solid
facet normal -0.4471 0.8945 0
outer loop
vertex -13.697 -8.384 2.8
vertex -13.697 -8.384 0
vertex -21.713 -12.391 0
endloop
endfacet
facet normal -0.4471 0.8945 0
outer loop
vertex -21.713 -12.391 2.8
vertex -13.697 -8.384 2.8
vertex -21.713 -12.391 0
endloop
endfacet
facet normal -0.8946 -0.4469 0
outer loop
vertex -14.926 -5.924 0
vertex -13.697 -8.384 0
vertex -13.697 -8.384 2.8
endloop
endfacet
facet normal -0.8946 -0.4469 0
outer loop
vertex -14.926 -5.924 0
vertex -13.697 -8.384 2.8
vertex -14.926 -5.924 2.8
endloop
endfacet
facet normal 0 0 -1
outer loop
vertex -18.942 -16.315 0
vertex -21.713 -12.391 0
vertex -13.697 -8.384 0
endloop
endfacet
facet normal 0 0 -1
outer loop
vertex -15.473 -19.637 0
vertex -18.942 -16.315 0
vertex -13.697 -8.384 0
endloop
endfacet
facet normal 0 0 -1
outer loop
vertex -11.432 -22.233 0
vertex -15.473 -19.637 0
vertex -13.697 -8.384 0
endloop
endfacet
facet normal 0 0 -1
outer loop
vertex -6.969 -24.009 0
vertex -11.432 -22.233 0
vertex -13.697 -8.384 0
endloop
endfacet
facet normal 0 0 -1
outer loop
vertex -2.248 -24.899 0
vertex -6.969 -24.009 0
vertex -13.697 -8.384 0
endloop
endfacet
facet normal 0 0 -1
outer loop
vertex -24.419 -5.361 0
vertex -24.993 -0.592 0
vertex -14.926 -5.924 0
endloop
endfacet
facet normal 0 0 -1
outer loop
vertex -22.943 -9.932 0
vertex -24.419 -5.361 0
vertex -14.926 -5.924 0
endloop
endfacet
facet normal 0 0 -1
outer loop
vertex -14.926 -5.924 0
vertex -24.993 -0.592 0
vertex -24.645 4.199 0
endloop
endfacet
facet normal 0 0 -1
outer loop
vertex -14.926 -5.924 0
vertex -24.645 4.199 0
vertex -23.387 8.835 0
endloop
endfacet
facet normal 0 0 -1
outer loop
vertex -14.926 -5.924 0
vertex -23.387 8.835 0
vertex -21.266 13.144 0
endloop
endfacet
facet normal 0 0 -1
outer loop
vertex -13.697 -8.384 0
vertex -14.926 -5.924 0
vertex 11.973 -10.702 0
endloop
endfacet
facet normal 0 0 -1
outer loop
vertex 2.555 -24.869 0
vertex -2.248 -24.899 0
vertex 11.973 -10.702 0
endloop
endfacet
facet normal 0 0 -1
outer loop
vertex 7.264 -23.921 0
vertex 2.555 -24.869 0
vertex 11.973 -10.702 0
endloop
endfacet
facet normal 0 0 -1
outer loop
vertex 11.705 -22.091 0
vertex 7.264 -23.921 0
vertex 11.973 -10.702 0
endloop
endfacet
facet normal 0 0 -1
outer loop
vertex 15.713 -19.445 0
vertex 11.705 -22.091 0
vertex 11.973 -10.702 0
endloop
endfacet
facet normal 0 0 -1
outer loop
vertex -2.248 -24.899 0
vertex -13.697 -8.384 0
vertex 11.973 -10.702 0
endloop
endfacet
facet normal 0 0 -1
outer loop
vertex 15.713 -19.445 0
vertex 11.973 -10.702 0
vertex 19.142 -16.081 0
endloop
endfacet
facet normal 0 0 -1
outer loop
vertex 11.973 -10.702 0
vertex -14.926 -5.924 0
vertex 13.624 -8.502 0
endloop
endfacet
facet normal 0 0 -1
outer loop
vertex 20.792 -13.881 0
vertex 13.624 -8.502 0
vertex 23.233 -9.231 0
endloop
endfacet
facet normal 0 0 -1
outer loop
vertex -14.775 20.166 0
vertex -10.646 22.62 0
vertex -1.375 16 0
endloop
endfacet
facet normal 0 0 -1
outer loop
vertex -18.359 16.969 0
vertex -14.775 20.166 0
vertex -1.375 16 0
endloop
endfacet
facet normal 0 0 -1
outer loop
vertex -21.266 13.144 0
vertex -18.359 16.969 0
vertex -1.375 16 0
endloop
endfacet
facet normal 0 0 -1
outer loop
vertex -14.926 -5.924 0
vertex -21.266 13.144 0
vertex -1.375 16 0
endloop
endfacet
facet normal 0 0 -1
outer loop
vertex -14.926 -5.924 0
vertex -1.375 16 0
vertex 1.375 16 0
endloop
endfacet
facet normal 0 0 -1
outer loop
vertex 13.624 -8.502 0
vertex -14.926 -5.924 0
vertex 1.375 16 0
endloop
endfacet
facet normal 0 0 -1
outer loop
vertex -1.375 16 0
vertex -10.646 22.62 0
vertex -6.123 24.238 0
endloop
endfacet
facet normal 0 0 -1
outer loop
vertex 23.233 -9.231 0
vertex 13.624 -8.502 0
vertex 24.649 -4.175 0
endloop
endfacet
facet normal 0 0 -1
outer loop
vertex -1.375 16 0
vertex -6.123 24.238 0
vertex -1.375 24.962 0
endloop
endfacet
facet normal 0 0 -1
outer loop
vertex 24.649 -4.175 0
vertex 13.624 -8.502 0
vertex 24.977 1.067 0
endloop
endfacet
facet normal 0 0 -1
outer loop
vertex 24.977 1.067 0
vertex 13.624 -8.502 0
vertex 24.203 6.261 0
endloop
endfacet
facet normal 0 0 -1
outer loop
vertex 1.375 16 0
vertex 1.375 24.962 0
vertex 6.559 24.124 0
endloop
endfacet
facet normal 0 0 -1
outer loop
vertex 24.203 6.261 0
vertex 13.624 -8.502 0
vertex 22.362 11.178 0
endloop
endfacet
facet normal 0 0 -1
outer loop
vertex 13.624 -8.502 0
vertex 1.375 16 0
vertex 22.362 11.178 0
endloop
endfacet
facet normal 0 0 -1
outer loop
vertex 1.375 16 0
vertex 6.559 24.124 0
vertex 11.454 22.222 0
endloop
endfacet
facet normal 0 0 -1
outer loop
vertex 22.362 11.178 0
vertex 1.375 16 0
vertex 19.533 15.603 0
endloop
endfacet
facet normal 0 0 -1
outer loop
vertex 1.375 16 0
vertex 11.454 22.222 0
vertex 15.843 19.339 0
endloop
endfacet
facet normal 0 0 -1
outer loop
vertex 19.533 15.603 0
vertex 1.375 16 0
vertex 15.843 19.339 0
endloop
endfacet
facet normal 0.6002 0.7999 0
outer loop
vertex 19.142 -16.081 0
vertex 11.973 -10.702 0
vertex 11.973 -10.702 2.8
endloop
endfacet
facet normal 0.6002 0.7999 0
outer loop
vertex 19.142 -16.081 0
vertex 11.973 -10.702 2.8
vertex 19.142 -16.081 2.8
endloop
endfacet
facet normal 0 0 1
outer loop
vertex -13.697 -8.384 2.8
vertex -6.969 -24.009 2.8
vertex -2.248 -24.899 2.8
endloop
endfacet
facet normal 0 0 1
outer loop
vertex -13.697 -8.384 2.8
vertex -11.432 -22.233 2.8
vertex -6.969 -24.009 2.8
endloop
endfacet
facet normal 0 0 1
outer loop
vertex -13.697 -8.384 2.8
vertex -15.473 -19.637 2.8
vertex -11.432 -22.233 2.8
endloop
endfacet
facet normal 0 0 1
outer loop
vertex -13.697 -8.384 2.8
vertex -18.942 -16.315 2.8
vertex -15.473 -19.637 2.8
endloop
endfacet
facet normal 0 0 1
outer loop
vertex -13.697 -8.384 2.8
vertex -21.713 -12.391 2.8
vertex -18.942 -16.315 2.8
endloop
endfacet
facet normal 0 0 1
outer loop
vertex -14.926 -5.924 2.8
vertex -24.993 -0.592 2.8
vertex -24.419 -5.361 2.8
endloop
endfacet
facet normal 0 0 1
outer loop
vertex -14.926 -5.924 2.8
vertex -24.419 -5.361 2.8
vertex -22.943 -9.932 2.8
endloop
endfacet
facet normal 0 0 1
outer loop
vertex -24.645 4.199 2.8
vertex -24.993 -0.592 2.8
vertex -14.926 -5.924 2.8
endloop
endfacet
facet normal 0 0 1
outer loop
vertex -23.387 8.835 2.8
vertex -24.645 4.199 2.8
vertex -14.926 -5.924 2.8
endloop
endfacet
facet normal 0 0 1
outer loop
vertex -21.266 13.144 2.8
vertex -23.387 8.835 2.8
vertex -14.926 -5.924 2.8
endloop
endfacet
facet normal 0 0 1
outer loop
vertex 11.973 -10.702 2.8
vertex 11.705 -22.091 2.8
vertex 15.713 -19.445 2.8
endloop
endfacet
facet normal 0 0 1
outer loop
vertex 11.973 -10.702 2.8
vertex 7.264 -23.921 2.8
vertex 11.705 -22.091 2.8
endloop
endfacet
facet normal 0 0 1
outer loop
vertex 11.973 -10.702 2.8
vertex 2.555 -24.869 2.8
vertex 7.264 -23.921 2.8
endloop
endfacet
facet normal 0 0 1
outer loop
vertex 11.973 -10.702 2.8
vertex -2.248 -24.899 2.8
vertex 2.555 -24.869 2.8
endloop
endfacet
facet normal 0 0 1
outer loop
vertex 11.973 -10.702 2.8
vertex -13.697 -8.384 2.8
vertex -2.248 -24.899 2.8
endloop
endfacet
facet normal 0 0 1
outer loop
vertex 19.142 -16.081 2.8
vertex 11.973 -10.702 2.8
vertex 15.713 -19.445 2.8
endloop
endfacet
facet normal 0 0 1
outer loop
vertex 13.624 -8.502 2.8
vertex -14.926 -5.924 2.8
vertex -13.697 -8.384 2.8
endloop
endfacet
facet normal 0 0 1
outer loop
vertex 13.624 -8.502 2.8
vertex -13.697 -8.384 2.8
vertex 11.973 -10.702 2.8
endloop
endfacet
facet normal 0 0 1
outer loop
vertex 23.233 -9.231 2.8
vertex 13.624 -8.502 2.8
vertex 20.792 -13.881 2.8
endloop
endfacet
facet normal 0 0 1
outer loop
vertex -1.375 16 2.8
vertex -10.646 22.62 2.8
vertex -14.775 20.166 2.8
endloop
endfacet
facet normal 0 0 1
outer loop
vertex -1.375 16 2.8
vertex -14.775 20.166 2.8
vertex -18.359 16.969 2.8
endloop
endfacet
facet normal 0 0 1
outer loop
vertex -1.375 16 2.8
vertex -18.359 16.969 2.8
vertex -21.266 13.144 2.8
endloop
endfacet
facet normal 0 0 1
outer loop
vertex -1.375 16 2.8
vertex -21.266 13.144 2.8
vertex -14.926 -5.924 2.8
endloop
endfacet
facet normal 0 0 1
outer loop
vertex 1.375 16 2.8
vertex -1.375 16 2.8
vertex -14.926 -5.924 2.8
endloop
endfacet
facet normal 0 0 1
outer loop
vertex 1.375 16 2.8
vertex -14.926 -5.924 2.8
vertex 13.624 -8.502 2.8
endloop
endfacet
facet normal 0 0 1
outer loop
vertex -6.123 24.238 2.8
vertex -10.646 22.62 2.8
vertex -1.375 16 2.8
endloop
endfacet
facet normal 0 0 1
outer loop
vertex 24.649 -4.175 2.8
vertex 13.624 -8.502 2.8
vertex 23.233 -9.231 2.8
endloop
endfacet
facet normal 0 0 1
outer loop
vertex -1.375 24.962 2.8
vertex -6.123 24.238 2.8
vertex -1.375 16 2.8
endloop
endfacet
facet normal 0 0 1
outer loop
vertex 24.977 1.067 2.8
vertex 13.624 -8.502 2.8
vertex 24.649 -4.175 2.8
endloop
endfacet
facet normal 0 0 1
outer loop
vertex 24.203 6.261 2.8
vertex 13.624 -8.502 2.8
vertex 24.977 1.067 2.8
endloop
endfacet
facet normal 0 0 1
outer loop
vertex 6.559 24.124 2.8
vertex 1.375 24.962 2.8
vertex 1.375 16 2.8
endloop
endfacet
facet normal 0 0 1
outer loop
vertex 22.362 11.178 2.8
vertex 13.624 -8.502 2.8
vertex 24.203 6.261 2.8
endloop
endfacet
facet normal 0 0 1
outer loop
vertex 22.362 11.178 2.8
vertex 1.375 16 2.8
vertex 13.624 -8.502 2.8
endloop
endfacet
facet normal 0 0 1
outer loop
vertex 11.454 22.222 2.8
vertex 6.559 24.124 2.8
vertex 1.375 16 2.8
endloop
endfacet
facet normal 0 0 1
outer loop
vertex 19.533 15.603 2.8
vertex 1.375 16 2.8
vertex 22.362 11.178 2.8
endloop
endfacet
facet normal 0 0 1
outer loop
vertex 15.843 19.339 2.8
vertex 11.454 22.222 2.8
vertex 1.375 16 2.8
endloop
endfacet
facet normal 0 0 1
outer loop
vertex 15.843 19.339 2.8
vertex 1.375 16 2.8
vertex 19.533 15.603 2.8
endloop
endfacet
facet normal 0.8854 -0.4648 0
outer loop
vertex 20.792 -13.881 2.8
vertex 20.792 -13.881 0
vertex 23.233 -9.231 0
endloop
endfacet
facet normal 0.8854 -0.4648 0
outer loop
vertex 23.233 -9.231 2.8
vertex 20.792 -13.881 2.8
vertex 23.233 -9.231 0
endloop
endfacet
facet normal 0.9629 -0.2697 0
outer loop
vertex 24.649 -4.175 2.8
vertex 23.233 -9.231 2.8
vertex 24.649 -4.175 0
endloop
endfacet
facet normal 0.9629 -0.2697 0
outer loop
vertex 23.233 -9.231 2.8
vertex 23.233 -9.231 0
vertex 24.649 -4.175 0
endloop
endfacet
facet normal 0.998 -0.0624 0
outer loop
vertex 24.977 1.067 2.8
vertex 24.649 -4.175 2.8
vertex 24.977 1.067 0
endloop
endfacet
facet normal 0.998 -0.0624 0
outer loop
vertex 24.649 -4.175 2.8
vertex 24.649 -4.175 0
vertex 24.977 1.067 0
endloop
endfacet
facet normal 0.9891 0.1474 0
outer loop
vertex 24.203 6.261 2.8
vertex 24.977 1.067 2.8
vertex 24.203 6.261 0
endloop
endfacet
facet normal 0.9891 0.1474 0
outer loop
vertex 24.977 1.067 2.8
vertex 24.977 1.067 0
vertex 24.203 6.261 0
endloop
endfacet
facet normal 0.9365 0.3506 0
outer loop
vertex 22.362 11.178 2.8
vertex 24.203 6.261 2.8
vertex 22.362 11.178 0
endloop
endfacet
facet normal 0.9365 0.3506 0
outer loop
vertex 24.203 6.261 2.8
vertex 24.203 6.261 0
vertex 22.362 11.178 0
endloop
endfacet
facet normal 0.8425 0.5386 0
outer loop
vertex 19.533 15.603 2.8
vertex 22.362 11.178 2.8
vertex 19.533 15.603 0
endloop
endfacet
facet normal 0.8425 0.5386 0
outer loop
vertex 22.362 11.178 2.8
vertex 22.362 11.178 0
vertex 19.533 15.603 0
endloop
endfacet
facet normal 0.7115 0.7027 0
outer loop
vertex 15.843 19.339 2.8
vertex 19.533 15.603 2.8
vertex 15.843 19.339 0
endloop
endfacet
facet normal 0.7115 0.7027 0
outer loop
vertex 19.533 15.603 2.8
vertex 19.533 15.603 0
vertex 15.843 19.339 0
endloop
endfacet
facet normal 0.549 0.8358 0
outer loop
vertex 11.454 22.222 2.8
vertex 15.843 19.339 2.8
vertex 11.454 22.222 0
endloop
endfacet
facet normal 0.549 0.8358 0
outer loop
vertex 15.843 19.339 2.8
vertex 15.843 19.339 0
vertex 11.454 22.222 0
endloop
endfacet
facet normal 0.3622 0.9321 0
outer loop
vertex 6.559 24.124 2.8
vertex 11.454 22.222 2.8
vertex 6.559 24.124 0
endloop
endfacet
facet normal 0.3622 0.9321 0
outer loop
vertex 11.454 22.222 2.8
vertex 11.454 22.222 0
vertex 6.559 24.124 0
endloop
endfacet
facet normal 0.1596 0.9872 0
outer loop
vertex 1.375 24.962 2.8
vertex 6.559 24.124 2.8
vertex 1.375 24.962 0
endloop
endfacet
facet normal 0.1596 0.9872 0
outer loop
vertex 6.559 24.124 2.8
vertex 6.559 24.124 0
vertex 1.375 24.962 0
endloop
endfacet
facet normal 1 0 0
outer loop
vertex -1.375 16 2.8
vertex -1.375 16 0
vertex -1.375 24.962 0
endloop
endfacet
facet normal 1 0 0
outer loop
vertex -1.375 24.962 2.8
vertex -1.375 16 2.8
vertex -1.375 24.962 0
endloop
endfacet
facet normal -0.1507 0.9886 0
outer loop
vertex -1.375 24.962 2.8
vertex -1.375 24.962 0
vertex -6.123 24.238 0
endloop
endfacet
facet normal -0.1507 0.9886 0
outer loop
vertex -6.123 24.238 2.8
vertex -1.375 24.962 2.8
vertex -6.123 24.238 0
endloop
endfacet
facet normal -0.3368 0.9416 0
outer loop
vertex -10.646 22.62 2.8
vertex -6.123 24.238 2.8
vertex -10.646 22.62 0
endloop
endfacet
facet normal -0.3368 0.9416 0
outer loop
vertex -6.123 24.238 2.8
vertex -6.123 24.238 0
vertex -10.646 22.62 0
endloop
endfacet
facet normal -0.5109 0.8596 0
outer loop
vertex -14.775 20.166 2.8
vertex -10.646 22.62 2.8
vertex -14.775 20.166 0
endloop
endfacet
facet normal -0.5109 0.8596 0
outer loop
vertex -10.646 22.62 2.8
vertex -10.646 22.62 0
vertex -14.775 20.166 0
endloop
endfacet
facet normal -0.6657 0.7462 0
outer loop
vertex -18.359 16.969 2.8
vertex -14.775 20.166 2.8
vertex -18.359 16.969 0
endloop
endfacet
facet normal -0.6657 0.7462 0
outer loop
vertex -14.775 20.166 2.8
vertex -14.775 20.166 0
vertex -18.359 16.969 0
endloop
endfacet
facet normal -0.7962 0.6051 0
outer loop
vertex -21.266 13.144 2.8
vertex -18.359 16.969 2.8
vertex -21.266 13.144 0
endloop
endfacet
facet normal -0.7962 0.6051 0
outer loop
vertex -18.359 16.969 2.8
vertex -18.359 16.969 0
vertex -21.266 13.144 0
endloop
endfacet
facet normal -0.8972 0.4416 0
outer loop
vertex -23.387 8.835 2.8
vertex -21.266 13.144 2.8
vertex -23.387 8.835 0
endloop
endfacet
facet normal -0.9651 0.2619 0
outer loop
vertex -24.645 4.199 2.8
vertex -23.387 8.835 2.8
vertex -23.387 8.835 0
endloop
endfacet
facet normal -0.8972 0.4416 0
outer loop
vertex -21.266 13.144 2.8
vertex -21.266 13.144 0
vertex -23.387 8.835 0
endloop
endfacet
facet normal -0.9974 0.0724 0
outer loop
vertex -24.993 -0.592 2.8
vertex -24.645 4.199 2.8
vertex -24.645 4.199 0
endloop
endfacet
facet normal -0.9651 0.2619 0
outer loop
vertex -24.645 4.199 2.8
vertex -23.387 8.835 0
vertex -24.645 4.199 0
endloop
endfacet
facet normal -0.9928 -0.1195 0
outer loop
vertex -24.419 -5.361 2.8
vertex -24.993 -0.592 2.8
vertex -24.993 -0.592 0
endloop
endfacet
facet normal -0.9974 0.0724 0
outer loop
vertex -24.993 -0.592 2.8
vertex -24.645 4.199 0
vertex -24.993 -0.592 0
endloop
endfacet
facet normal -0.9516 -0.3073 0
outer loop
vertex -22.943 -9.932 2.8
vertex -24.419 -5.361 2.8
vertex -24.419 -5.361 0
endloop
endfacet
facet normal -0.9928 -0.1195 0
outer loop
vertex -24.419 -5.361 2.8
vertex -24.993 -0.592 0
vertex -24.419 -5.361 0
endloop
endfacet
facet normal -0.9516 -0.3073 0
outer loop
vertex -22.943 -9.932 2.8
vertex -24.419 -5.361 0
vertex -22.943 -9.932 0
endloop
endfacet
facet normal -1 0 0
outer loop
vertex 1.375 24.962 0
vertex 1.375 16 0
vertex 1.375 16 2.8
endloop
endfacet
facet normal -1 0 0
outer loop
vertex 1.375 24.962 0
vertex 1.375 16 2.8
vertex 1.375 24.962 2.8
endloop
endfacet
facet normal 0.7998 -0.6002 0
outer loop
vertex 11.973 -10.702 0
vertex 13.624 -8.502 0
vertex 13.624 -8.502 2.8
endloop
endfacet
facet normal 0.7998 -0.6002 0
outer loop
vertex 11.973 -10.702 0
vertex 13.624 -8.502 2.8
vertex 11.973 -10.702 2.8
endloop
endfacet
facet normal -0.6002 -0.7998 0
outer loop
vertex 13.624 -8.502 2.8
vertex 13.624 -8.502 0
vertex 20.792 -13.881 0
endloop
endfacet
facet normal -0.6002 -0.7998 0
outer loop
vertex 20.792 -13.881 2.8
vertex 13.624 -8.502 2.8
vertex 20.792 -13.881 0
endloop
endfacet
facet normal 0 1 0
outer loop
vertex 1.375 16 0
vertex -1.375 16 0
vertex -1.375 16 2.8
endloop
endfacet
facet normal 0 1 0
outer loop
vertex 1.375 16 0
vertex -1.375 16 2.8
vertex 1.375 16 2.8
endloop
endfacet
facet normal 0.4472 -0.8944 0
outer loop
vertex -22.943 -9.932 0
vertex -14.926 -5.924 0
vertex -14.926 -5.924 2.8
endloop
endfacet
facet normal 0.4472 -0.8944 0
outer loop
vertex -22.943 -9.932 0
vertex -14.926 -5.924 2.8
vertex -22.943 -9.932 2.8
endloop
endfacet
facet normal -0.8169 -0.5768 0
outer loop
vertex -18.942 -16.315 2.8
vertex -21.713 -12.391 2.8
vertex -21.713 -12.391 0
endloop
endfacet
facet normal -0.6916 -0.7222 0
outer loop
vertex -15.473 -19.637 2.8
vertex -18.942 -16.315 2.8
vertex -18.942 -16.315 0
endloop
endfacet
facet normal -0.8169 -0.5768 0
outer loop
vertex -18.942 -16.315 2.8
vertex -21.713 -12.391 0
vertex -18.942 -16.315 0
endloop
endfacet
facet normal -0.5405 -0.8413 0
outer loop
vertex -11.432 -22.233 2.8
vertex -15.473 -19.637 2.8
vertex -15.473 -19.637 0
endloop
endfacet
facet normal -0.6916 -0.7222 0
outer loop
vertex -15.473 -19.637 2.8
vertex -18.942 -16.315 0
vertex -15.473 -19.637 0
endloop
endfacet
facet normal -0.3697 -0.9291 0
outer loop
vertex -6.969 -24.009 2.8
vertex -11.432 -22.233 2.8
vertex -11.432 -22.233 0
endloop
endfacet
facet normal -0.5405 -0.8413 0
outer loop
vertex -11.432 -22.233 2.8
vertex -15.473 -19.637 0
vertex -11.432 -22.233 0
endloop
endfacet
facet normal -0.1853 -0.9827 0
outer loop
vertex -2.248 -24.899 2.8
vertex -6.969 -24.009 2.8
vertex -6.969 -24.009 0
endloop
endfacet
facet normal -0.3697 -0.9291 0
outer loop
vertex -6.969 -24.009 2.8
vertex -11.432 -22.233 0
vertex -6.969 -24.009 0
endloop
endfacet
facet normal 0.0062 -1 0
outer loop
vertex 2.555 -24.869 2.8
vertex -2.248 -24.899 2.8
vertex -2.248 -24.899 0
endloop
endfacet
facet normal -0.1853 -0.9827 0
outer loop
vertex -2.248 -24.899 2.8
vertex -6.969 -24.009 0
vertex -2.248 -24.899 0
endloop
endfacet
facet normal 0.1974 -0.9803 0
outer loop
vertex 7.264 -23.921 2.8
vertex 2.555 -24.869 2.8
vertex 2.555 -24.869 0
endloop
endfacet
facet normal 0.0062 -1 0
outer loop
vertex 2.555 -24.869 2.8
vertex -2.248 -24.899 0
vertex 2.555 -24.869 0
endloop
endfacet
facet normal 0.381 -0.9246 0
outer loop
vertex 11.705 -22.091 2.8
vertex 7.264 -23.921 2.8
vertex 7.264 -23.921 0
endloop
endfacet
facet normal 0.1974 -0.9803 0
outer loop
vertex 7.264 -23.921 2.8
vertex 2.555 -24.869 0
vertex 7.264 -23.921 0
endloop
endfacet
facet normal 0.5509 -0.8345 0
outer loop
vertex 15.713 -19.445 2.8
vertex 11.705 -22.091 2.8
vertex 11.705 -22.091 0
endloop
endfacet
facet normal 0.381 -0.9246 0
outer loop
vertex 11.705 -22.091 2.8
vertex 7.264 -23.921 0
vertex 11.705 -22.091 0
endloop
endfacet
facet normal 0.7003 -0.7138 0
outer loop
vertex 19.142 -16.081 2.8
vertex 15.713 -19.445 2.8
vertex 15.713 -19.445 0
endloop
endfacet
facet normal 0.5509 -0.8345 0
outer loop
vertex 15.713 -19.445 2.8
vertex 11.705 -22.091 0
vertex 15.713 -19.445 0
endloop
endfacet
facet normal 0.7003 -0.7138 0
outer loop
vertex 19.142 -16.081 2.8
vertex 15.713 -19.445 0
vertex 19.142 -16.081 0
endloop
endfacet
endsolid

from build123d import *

# Parameters (mm, degrees)
CROQUIS1_R              = 25
SALIENTE_EXTRUIR1_DEPTH = 2.8
CROQUIS2_W              = 2.75
CROQUIS2_H              = 18
CORTAR_EXTRUIR1_DEPTH   = 3.8
MATRIZC2_COUNT          = 3
MATRIZC2_ANGLE          = 233.12


with BuildPart() as part:
    # Croquis1 → Saliente-Extruir1 (new body)
    with BuildSketch(Plane.XY):
        Circle(CROQUIS1_R)
    extrude(amount=SALIENTE_EXTRUIR1_DEPTH)

    # Croquis2 → Cortar-Extruir1 (cut, through all)
    with BuildSketch(Plane.XY):
        with Locations((0, 25)):
            Rectangle(CROQUIS2_W, CROQUIS2_H)
    cortar_extruir1 = extrude(amount=CORTAR_EXTRUIR1_DEPTH, mode=Mode.SUBTRACT)

    # MatrizC2: Cortar-Extruir1 ×3 about axis
    matrizc2_axis = Axis((0, 0, 0), (0, 0, 1))
    for i in range(1, MATRIZC2_COUNT):
        add(cortar_extruir1.rotate(matrizc2_axis, i * MATRIZC2_ANGLE / (MATRIZC2_COUNT - 1)), mode=Mode.SUBTRACT)


solid = part.part
